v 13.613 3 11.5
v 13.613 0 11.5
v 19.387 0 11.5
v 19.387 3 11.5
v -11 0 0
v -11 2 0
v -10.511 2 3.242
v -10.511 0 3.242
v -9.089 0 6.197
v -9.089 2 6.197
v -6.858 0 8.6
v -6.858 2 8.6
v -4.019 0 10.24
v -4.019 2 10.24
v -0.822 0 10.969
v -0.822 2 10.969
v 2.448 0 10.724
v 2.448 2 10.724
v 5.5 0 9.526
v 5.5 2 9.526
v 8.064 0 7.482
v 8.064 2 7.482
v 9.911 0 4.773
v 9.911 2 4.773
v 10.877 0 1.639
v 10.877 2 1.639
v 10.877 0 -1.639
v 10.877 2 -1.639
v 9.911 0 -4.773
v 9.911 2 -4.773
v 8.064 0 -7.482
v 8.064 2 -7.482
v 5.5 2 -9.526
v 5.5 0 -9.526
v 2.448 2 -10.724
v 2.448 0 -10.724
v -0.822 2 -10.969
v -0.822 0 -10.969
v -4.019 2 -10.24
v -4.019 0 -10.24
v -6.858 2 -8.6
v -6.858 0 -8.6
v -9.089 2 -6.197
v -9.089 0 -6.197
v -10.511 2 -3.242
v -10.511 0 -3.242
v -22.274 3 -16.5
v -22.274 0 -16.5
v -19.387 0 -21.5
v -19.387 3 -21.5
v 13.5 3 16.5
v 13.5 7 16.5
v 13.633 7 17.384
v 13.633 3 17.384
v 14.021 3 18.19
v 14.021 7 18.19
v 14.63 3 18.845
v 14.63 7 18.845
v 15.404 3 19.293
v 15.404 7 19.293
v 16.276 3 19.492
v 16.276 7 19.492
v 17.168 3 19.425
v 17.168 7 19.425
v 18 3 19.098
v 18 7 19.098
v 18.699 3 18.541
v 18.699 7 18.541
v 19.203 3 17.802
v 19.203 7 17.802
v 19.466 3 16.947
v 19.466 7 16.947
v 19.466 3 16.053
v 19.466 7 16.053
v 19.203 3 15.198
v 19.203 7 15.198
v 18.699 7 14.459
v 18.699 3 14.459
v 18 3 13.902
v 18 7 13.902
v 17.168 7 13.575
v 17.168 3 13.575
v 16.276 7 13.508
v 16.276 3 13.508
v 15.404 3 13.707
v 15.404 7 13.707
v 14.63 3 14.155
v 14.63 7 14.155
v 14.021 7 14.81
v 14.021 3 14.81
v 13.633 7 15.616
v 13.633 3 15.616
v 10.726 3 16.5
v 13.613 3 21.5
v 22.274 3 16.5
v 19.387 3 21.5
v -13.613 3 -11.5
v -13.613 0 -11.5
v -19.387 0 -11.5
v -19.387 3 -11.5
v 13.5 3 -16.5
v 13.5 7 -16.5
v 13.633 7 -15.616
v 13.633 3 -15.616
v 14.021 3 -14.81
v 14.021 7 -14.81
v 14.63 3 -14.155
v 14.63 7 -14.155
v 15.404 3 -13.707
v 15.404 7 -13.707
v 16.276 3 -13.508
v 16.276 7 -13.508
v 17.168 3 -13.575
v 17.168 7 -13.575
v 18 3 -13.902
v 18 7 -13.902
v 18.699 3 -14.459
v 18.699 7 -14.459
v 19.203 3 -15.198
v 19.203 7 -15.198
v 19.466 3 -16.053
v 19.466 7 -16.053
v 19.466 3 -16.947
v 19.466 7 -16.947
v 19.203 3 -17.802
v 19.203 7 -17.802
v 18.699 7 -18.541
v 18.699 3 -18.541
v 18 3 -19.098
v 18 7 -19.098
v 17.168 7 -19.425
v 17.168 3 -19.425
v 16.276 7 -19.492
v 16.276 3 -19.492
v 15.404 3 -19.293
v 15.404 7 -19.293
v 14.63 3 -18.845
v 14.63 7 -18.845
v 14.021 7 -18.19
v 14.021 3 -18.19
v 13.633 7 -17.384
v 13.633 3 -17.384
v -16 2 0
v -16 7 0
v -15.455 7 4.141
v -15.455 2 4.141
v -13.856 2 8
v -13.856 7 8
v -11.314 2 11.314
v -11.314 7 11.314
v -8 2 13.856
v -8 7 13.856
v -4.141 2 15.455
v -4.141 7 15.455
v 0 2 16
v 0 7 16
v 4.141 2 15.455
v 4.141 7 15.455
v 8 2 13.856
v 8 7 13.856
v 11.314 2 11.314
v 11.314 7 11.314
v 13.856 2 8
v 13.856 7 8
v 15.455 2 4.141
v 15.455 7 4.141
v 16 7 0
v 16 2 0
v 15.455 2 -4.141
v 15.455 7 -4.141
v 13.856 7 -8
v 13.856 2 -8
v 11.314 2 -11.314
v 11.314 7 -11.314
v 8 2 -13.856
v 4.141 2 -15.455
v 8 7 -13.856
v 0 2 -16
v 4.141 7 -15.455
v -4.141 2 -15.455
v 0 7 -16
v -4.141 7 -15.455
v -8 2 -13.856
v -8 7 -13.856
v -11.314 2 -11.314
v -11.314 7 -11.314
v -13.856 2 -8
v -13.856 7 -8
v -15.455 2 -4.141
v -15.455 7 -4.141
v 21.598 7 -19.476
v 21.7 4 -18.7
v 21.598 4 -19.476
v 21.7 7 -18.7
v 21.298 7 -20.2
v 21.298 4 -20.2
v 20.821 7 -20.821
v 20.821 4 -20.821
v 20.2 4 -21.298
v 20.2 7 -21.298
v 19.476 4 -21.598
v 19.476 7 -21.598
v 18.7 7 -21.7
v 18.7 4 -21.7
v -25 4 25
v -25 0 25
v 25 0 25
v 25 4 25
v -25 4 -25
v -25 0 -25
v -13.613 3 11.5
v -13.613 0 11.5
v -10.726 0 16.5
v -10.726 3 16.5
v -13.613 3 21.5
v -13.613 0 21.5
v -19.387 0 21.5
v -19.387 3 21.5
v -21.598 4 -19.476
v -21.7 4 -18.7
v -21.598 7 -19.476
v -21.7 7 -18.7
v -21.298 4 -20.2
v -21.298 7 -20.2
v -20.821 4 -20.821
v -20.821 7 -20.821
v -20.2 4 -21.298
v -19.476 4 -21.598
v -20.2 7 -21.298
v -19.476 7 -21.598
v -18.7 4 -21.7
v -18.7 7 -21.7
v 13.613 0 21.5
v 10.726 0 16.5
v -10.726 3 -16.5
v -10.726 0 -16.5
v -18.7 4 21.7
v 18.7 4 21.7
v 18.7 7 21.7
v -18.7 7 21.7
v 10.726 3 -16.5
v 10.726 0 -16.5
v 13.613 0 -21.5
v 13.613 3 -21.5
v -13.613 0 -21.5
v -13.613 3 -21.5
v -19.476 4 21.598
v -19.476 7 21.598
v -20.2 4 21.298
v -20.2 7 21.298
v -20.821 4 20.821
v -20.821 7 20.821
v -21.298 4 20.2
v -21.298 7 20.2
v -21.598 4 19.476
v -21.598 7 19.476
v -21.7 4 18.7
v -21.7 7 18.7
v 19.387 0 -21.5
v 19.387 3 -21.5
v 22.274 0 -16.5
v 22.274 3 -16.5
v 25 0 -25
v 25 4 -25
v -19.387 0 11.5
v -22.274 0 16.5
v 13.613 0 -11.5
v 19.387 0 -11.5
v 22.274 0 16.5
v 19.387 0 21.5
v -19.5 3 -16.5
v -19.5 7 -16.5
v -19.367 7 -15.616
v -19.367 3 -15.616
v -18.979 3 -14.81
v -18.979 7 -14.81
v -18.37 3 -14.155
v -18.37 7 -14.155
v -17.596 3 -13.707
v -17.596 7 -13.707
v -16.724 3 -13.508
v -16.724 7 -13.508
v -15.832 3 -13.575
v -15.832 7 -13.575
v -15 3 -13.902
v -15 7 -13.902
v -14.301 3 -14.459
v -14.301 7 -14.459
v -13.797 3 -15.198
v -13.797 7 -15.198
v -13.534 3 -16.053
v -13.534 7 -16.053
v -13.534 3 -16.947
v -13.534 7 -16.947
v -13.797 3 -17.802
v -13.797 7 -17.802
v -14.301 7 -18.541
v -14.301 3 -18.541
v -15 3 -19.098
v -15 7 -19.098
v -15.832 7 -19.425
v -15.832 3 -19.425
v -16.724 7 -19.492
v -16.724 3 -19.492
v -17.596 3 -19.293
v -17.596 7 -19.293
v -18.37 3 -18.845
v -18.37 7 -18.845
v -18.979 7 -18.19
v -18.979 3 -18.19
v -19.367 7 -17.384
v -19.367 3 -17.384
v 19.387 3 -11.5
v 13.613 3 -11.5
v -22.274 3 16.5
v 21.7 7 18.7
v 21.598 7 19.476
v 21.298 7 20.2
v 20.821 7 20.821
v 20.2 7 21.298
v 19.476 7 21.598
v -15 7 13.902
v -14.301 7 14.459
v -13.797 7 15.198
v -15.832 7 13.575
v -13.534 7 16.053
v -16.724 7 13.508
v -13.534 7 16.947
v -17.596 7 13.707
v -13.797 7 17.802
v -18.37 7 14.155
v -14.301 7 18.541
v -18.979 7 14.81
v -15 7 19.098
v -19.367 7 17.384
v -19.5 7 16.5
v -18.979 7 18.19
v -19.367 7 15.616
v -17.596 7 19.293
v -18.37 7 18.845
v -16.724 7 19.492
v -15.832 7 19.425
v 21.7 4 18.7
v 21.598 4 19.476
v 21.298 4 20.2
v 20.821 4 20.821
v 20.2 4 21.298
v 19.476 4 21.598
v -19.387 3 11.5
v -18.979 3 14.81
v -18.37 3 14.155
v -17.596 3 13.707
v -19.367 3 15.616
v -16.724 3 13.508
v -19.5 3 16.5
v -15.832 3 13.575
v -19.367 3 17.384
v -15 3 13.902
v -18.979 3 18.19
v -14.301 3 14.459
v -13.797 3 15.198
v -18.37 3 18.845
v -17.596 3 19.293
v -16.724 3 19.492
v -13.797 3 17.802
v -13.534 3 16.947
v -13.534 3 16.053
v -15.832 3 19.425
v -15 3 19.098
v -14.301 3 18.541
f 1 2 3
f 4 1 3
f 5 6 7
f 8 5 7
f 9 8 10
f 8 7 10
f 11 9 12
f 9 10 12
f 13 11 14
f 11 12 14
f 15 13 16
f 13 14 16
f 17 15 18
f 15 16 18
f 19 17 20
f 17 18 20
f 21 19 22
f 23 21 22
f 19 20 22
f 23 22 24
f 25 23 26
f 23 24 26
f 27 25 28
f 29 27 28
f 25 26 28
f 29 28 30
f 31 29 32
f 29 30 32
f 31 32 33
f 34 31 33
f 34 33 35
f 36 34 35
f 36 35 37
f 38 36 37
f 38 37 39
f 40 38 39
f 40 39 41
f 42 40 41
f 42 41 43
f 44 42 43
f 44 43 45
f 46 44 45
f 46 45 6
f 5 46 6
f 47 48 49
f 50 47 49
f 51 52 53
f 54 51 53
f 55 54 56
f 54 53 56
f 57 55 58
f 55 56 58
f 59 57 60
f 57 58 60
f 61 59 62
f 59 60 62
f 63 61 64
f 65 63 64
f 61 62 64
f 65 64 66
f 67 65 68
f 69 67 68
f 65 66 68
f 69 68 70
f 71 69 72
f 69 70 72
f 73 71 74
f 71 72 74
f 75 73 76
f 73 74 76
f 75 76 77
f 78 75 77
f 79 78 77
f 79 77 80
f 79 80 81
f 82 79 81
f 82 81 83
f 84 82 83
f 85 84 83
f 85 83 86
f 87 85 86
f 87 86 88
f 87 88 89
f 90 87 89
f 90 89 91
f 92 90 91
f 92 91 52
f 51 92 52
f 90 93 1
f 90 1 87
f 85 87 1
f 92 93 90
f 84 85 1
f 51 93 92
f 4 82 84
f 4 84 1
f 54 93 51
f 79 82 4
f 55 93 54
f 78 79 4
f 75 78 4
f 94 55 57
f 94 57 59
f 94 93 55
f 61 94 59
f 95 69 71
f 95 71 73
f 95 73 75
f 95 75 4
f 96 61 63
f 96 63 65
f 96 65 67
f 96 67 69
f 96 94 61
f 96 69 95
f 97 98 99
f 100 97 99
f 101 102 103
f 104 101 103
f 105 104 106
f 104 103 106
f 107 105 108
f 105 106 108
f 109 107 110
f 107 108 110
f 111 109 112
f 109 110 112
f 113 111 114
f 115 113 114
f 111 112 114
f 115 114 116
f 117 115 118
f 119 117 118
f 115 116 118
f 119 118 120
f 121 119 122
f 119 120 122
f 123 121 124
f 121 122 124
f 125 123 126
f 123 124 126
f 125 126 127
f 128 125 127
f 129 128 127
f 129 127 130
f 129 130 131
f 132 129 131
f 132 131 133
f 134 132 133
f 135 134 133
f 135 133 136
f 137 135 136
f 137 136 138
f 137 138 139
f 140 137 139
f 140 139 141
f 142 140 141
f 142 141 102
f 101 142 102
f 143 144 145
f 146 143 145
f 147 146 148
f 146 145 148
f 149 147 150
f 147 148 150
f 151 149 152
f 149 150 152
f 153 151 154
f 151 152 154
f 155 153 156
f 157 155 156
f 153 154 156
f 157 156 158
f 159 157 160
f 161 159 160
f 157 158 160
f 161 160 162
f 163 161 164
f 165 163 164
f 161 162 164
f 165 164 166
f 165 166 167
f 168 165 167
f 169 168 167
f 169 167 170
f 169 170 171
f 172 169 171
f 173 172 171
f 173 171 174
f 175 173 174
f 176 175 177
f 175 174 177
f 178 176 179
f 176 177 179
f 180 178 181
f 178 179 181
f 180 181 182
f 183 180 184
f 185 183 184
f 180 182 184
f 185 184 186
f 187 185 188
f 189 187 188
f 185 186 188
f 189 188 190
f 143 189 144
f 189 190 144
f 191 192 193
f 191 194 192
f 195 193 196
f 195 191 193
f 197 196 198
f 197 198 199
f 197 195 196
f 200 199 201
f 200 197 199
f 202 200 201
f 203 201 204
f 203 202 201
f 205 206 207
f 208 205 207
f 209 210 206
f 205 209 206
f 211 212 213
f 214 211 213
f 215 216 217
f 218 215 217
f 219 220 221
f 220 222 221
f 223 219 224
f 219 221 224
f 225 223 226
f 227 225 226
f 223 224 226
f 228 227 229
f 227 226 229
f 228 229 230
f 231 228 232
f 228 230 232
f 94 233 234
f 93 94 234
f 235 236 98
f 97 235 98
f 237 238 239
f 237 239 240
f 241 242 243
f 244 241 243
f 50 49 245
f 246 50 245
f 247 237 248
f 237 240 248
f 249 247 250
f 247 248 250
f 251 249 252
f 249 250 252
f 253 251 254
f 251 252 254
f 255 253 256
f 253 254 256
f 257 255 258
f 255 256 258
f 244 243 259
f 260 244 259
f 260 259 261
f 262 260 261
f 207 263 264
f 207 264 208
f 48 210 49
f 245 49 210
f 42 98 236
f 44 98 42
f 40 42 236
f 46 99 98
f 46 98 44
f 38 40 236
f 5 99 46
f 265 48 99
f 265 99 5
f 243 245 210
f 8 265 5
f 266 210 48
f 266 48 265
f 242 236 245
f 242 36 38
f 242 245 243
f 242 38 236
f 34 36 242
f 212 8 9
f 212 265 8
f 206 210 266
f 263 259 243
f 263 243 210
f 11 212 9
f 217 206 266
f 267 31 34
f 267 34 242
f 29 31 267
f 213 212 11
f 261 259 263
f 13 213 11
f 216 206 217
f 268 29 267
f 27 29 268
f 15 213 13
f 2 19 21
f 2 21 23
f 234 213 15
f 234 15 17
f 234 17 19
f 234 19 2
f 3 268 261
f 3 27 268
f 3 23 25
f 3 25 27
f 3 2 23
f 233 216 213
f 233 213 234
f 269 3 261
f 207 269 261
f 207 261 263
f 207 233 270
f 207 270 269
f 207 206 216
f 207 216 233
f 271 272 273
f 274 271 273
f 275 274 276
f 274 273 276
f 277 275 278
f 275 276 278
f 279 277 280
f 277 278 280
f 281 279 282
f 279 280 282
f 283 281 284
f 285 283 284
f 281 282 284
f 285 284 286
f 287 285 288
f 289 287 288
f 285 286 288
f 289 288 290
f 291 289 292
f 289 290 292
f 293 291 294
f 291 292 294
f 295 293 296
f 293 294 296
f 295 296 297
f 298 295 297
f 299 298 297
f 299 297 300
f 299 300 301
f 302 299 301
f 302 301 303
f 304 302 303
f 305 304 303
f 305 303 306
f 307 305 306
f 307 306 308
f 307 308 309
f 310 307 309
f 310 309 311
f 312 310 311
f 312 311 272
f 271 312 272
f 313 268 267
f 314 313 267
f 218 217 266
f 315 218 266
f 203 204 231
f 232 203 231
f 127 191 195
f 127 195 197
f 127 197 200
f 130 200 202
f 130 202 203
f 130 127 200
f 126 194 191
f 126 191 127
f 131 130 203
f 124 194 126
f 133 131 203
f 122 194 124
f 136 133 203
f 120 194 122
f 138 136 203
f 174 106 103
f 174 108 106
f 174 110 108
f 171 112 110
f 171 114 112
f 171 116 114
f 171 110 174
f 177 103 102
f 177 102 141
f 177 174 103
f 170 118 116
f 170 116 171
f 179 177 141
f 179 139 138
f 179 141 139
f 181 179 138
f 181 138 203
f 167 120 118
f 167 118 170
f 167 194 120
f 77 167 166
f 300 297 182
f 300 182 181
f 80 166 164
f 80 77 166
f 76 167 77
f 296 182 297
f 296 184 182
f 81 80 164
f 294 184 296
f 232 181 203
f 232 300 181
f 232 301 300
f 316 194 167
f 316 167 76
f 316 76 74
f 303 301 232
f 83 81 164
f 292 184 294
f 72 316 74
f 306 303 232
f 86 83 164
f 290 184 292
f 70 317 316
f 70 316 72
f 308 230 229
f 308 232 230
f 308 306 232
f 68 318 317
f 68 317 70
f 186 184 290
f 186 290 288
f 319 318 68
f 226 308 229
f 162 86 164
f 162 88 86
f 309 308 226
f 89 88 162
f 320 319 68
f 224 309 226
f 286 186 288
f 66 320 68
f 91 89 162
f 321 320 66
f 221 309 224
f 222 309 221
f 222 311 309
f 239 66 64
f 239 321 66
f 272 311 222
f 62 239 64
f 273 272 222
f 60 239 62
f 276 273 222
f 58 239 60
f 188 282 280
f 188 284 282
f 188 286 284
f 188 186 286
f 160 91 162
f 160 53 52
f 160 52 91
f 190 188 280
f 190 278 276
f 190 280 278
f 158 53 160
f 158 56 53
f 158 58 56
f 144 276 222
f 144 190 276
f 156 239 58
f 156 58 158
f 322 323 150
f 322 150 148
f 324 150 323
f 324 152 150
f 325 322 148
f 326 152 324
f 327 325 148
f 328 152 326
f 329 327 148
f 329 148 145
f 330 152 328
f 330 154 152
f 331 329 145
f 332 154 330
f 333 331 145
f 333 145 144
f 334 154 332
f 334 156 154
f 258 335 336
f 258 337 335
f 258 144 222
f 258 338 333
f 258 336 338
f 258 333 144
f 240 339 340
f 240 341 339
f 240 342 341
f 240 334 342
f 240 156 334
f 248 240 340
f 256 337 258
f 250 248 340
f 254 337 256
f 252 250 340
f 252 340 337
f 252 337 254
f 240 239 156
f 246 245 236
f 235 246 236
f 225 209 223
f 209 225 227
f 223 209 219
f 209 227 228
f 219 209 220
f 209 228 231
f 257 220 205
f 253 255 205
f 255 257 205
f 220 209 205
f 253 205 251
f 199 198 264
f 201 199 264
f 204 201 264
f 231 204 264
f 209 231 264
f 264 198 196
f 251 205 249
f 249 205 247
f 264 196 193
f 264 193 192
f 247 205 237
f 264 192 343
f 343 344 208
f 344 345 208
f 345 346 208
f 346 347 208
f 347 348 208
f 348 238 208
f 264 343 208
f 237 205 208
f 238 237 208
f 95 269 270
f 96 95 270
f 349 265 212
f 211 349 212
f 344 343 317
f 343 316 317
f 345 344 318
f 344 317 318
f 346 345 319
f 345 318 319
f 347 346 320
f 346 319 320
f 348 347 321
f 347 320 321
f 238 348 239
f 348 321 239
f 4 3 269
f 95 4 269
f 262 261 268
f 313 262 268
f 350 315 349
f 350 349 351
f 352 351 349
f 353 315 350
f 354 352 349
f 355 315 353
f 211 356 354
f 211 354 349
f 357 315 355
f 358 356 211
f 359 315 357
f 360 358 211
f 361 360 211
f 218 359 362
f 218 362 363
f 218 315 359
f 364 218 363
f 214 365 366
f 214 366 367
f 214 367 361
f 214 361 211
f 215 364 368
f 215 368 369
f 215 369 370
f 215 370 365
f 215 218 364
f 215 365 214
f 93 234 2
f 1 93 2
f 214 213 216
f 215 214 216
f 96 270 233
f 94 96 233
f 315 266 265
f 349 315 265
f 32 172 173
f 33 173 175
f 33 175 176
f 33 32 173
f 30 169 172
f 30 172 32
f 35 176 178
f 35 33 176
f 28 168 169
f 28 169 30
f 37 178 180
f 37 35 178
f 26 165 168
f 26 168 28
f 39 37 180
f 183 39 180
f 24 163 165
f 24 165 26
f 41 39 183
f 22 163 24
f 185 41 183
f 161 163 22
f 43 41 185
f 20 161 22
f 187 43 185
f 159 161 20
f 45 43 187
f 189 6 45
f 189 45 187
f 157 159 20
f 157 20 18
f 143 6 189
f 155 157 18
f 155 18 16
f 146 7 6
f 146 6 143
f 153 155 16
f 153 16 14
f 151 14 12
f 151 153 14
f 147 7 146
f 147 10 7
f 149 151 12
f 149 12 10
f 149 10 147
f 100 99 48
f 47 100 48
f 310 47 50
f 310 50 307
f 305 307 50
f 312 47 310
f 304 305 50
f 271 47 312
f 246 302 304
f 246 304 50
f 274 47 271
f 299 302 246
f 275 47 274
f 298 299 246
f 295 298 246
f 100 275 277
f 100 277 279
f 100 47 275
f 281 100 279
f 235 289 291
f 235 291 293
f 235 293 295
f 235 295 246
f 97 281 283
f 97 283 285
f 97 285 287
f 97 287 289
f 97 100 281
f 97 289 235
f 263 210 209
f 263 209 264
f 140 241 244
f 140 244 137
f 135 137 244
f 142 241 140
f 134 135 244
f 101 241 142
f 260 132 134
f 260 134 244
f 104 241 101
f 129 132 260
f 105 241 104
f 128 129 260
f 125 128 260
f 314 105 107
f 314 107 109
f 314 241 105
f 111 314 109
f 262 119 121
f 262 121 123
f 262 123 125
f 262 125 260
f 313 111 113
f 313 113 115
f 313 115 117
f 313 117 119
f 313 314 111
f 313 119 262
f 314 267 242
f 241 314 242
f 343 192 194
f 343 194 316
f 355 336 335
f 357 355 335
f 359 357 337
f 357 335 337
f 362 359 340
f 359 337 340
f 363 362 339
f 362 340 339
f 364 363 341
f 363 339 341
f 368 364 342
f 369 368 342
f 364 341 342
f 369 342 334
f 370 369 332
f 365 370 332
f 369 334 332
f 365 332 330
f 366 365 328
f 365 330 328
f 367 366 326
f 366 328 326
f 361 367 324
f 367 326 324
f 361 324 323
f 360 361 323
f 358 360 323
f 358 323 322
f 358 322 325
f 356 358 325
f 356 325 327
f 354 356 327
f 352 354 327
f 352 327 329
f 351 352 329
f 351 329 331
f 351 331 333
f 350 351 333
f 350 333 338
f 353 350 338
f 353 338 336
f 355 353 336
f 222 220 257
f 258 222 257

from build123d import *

# Parameters (mm, degrees)
F0_W     = 50
F0_H     = 50
F1_DEPTH = 4
F2_W     = 43.4
F2_H     = 43.4
F3_DEPTH = 3
F4_R     = 3
F4_R_2   = 11
F5_DEPTH = 25
F7_DEPTH = 3
F8_R     = 16
F9_DEPTH = 5
F10_R    = 3


with BuildPart() as f1:
    # F0 (on Front) → F1 (new body)
    with BuildSketch(Plane.XZ):
        Rectangle(F0_W, F0_H)
    extrude(amount=-F1_DEPTH)

    # F2 (on face) → F3 (join)
    with BuildSketch(Plane(origin=(0, 4, 0), x_dir=(-1, 0, 0), z_dir=(0, 1, 0))):
        Rectangle(F2_W, F2_H)
    extrude(amount=F3_DEPTH)

    # F4 (on face) → F5 (cut)
    with BuildSketch(Plane(origin=(0, 7, 0), x_dir=(-1, 0, 0), z_dir=(0, 1, 0))):
        with Locations((-16.5, 16.5)):
            Circle(F4_R)
        with Locations((16.5, 16.5)):
            Circle(F4_R)
        with Locations((16.5, -16.5)):
            Circle(F4_R)
        with Locations((-16.5, -16.5)):
            Circle(F4_R)
        Circle(F4_R_2)
    extrude(amount=-F5_DEPTH, mode=Mode.SUBTRACT)

    # F6 (on face) → F7 (cut)
    with BuildSketch(Plane.XZ):
        Polygon((-19.386751, 11.5), (-13.613249, 11.5), (-10.726497, 16.5), (-13.613249, 21.5), (-19.386751, 21.5), (-22.273503, 16.5), align=None)
        Polygon((19.386751, 21.5), (13.613249, 21.5), (10.726497, 16.5), (13.613249, 11.5), (19.386751, 11.5), (22.273503, 16.5), align=None)
        Polygon((13.613249, -21.5), (19.386751, -21.5), (22.273503, -16.5), (19.386751, -11.5), (13.613249, -11.5), (10.726497, -16.5), align=None)
        Polygon((-19.386751, -21.5), (-13.613249, -21.5), (-10.726497, -16.5), (-13.613249, -11.5), (-19.386751, -11.5), (-22.273503, -16.5), align=None)
    extrude(amount=-F7_DEPTH, mode=Mode.SUBTRACT)

    # F8 (on face) → F9 (cut)
    with BuildSketch(Plane(origin=(0, 7, 0), x_dir=(-1, 0, 0), z_dir=(0, 1, 0))):
        Circle(F8_R)
    extrude(amount=-F9_DEPTH, mode=Mode.SUBTRACT)

    # F10
    f10_edges = [f1.edges().sort_by_distance(p)[0] for p in [
        (21.7, 5.5, 21.7),
        (21.7, 5.5, -21.7),
        (-21.7, 5.5, -21.7),
        (-21.7, 5.5, 21.7),
    ]]
    fillet(f10_edges, radius=F10_R)


solid = f1.part
